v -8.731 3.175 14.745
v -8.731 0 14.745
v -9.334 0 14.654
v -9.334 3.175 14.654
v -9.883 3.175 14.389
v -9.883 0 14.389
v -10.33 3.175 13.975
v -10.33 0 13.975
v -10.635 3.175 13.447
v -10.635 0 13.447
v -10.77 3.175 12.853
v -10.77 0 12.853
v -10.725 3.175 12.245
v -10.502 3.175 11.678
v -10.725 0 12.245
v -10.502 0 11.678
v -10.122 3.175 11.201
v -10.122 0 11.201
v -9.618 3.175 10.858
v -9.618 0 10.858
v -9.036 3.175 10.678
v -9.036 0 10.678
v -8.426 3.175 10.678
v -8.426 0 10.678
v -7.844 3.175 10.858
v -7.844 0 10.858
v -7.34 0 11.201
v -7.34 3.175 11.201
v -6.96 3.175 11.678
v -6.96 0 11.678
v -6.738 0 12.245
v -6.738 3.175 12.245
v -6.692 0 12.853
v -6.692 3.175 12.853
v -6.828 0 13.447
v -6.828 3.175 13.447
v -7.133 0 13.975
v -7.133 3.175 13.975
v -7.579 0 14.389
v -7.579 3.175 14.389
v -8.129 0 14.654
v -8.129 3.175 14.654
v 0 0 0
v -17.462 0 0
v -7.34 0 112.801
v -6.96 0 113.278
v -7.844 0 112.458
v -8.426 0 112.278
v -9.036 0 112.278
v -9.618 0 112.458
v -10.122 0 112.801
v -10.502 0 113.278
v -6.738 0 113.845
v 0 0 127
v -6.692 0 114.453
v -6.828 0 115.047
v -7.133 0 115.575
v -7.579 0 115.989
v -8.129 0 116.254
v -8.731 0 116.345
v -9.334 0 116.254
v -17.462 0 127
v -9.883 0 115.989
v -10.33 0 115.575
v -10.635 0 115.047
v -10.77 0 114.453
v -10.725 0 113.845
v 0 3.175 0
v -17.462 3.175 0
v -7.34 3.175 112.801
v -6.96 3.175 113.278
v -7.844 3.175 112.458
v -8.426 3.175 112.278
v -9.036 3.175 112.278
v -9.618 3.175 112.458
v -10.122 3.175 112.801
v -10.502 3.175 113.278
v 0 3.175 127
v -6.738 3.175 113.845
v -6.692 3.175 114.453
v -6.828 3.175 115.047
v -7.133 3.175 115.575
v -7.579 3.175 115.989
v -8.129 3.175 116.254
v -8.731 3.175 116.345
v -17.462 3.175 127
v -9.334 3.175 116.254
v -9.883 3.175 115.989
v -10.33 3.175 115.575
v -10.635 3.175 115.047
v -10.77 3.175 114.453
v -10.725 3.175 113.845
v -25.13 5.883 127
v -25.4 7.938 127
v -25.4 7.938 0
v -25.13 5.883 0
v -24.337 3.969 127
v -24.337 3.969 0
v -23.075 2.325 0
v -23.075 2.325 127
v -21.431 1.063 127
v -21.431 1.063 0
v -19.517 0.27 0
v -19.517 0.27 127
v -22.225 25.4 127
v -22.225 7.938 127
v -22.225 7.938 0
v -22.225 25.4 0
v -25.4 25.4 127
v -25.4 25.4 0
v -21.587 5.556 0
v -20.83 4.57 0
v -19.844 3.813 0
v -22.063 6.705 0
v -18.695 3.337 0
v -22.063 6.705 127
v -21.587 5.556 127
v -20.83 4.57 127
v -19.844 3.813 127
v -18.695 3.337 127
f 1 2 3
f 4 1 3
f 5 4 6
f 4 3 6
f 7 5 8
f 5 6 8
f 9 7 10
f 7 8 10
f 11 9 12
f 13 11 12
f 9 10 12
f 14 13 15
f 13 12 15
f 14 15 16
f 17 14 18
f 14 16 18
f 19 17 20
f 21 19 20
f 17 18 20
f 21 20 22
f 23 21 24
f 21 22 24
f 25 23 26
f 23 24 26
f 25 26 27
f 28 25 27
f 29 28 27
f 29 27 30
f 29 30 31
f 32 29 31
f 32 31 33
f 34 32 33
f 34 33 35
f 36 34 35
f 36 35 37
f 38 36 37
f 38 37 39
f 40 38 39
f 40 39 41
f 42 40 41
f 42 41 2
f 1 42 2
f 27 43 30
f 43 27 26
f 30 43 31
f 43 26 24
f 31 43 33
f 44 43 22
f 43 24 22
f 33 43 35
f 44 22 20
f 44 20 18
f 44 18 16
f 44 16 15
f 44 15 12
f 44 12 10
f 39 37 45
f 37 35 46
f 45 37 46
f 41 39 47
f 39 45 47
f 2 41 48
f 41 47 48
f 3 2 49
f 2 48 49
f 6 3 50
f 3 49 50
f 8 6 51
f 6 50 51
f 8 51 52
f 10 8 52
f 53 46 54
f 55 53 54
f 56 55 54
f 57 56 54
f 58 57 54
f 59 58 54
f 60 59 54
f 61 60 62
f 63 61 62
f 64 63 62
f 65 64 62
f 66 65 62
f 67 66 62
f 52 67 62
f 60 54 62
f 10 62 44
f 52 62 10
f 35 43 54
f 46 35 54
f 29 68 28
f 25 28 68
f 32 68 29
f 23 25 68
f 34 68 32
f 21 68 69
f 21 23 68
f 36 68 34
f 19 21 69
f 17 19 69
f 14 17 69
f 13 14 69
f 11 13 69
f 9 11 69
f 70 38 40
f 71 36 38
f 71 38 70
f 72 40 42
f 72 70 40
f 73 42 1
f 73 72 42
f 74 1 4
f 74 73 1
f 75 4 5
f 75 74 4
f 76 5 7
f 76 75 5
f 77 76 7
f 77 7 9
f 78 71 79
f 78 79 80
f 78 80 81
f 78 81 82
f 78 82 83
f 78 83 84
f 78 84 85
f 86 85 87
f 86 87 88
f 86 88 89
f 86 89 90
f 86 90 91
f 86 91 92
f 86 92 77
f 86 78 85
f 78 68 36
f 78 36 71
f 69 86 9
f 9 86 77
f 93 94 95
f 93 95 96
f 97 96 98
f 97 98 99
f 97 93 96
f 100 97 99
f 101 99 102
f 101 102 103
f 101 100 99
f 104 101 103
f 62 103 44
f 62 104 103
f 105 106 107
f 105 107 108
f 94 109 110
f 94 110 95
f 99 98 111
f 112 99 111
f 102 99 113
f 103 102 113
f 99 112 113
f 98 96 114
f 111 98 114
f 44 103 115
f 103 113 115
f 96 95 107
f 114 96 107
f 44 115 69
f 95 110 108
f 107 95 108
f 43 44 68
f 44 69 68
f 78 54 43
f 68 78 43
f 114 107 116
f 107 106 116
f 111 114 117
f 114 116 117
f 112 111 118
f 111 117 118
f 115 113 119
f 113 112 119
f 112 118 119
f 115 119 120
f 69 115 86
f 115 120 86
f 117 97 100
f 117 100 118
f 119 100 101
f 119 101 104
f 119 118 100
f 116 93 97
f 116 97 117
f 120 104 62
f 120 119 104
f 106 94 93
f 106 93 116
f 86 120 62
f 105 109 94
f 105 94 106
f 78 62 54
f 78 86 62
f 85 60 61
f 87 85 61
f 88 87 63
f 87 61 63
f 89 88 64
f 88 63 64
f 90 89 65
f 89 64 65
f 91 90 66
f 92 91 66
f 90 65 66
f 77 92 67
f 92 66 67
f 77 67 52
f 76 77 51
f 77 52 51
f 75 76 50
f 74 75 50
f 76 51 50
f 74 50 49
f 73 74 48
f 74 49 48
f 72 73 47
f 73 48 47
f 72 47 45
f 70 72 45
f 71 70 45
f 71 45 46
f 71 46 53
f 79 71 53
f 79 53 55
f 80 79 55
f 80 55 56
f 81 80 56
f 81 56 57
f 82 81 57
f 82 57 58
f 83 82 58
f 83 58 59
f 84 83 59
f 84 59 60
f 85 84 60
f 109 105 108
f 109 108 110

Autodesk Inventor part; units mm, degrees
ref_plane "YZ Plane" through (0, 0, 0) normal (1, 0, 0) x (0, 1, 0)
ref_plane "XZ Plane" through (0, 0, 0) normal (0, 1, 0) x (-1, 0, 0)
ref_plane "XY Plane" through (0, 0, 0) normal (0, 0, 1) x (1, 0, 0)
sketch "Sketch1" plane through (0, 0, 0) normal (0, 1, 0) x (-1, 0, 0)
  line L0 (0, 0) -> (25.4, 0)
  line L1 (25.4, 0) -> (25.4, 127)
  line L2 (25.4, 127) -> (0, 127)
  line L3 (0, 127) -> (0, 0)
  dimension "d0" = 25.4
  dimension "d1" = 127
extrude "Plate1" add sketch "Sketch1" along normal blind 3.175
sketch "Sketch2" plane through (-22.225, 0, 127) normal (-1, 0, 0) x (0, -1, 0)
  line L0 (0, -127) -> (0, 0)
  line L1 (0, 0) -> (-25.4, 0)
  line L2 (-25.4, 0) -> (-25.4, -127)
  line L3 (-25.4, -127) -> (0, -127)
edge flange "Flange1" height 25.4 angle 90 thickness 3.175 bend radius 4.7625 thickness toward (-1, 0, 0) relief tear relief width 3.175 relief depth 1.5875 edges at (-25.4, 3.175, 63.5) wall of the first edge with corners at (-22.225, 0, 0) (-22.225, 0, 127) (-22.225, 25.4, 127) (-22.225, 25.4, 0)
bend "Bend1"
corner "Corner1"
sketch "Sketch3" plane through (0, 3.175, 0) normal (0, 1, 0) x (1, 0, 0)
  line L0 (-17.4625, 0) -> (0, 0) construction
  line L1 (-8.7313, 0) -> (-8.7312, -127) construction
  line L2 (0, -127) -> (-17.4625, -127) construction
  point P0 (-8.7312, -12.7)
  point P1 (-8.7312, -114.3)
  dimension "d13" = 12.7
  dimension "d14" = 12.7
hole "Hole1" at (-8.7312, 3.175, 12.7) at (-8.7312, 3.175, 114.3) direction (0, -1, 0) diameter 4.0894 end through all clearance for "Pop Rivet" size "5/32" standard "4859 Fastners"
equation "\"d20\" = Thickness"
equation "\"d2\" = Thickness"
equation "\"d3\" = BendReliefWidth"
equation "\"d4\" = BendReliefDepth"
equation "\"d5\" = MinimumRemnant"
equation "\"d6\" = TransitionRadius"
equation "\"d9\" = BendRadius"
equation "\"d10\" = CornerReliefSize"
equation "\"d11\" = GapSize"
equation "\"d12\" = JacobiRadiusSize"
equation "\"BendRadius\" = 1.5 * Thickness"
equation "\"BendReliefWidth\" = Thickness"
equation "\"BendReliefDepth\" = 0.5 * Thickness"
equation "\"CornerReliefSize\" = 4 * Thickness"
equation "\"MinimumRemnant\" = 2 * Thickness"
equation "\"TransitionRadius\" = BendRadius"
equation "\"JacobiRadiusSize\" = BendRadius"
equation "\"GapSize\" = Thickness"
equation "\"Thickness\" = 3.175"
properties part number "200512" material "Aluminum 5052 H32"
